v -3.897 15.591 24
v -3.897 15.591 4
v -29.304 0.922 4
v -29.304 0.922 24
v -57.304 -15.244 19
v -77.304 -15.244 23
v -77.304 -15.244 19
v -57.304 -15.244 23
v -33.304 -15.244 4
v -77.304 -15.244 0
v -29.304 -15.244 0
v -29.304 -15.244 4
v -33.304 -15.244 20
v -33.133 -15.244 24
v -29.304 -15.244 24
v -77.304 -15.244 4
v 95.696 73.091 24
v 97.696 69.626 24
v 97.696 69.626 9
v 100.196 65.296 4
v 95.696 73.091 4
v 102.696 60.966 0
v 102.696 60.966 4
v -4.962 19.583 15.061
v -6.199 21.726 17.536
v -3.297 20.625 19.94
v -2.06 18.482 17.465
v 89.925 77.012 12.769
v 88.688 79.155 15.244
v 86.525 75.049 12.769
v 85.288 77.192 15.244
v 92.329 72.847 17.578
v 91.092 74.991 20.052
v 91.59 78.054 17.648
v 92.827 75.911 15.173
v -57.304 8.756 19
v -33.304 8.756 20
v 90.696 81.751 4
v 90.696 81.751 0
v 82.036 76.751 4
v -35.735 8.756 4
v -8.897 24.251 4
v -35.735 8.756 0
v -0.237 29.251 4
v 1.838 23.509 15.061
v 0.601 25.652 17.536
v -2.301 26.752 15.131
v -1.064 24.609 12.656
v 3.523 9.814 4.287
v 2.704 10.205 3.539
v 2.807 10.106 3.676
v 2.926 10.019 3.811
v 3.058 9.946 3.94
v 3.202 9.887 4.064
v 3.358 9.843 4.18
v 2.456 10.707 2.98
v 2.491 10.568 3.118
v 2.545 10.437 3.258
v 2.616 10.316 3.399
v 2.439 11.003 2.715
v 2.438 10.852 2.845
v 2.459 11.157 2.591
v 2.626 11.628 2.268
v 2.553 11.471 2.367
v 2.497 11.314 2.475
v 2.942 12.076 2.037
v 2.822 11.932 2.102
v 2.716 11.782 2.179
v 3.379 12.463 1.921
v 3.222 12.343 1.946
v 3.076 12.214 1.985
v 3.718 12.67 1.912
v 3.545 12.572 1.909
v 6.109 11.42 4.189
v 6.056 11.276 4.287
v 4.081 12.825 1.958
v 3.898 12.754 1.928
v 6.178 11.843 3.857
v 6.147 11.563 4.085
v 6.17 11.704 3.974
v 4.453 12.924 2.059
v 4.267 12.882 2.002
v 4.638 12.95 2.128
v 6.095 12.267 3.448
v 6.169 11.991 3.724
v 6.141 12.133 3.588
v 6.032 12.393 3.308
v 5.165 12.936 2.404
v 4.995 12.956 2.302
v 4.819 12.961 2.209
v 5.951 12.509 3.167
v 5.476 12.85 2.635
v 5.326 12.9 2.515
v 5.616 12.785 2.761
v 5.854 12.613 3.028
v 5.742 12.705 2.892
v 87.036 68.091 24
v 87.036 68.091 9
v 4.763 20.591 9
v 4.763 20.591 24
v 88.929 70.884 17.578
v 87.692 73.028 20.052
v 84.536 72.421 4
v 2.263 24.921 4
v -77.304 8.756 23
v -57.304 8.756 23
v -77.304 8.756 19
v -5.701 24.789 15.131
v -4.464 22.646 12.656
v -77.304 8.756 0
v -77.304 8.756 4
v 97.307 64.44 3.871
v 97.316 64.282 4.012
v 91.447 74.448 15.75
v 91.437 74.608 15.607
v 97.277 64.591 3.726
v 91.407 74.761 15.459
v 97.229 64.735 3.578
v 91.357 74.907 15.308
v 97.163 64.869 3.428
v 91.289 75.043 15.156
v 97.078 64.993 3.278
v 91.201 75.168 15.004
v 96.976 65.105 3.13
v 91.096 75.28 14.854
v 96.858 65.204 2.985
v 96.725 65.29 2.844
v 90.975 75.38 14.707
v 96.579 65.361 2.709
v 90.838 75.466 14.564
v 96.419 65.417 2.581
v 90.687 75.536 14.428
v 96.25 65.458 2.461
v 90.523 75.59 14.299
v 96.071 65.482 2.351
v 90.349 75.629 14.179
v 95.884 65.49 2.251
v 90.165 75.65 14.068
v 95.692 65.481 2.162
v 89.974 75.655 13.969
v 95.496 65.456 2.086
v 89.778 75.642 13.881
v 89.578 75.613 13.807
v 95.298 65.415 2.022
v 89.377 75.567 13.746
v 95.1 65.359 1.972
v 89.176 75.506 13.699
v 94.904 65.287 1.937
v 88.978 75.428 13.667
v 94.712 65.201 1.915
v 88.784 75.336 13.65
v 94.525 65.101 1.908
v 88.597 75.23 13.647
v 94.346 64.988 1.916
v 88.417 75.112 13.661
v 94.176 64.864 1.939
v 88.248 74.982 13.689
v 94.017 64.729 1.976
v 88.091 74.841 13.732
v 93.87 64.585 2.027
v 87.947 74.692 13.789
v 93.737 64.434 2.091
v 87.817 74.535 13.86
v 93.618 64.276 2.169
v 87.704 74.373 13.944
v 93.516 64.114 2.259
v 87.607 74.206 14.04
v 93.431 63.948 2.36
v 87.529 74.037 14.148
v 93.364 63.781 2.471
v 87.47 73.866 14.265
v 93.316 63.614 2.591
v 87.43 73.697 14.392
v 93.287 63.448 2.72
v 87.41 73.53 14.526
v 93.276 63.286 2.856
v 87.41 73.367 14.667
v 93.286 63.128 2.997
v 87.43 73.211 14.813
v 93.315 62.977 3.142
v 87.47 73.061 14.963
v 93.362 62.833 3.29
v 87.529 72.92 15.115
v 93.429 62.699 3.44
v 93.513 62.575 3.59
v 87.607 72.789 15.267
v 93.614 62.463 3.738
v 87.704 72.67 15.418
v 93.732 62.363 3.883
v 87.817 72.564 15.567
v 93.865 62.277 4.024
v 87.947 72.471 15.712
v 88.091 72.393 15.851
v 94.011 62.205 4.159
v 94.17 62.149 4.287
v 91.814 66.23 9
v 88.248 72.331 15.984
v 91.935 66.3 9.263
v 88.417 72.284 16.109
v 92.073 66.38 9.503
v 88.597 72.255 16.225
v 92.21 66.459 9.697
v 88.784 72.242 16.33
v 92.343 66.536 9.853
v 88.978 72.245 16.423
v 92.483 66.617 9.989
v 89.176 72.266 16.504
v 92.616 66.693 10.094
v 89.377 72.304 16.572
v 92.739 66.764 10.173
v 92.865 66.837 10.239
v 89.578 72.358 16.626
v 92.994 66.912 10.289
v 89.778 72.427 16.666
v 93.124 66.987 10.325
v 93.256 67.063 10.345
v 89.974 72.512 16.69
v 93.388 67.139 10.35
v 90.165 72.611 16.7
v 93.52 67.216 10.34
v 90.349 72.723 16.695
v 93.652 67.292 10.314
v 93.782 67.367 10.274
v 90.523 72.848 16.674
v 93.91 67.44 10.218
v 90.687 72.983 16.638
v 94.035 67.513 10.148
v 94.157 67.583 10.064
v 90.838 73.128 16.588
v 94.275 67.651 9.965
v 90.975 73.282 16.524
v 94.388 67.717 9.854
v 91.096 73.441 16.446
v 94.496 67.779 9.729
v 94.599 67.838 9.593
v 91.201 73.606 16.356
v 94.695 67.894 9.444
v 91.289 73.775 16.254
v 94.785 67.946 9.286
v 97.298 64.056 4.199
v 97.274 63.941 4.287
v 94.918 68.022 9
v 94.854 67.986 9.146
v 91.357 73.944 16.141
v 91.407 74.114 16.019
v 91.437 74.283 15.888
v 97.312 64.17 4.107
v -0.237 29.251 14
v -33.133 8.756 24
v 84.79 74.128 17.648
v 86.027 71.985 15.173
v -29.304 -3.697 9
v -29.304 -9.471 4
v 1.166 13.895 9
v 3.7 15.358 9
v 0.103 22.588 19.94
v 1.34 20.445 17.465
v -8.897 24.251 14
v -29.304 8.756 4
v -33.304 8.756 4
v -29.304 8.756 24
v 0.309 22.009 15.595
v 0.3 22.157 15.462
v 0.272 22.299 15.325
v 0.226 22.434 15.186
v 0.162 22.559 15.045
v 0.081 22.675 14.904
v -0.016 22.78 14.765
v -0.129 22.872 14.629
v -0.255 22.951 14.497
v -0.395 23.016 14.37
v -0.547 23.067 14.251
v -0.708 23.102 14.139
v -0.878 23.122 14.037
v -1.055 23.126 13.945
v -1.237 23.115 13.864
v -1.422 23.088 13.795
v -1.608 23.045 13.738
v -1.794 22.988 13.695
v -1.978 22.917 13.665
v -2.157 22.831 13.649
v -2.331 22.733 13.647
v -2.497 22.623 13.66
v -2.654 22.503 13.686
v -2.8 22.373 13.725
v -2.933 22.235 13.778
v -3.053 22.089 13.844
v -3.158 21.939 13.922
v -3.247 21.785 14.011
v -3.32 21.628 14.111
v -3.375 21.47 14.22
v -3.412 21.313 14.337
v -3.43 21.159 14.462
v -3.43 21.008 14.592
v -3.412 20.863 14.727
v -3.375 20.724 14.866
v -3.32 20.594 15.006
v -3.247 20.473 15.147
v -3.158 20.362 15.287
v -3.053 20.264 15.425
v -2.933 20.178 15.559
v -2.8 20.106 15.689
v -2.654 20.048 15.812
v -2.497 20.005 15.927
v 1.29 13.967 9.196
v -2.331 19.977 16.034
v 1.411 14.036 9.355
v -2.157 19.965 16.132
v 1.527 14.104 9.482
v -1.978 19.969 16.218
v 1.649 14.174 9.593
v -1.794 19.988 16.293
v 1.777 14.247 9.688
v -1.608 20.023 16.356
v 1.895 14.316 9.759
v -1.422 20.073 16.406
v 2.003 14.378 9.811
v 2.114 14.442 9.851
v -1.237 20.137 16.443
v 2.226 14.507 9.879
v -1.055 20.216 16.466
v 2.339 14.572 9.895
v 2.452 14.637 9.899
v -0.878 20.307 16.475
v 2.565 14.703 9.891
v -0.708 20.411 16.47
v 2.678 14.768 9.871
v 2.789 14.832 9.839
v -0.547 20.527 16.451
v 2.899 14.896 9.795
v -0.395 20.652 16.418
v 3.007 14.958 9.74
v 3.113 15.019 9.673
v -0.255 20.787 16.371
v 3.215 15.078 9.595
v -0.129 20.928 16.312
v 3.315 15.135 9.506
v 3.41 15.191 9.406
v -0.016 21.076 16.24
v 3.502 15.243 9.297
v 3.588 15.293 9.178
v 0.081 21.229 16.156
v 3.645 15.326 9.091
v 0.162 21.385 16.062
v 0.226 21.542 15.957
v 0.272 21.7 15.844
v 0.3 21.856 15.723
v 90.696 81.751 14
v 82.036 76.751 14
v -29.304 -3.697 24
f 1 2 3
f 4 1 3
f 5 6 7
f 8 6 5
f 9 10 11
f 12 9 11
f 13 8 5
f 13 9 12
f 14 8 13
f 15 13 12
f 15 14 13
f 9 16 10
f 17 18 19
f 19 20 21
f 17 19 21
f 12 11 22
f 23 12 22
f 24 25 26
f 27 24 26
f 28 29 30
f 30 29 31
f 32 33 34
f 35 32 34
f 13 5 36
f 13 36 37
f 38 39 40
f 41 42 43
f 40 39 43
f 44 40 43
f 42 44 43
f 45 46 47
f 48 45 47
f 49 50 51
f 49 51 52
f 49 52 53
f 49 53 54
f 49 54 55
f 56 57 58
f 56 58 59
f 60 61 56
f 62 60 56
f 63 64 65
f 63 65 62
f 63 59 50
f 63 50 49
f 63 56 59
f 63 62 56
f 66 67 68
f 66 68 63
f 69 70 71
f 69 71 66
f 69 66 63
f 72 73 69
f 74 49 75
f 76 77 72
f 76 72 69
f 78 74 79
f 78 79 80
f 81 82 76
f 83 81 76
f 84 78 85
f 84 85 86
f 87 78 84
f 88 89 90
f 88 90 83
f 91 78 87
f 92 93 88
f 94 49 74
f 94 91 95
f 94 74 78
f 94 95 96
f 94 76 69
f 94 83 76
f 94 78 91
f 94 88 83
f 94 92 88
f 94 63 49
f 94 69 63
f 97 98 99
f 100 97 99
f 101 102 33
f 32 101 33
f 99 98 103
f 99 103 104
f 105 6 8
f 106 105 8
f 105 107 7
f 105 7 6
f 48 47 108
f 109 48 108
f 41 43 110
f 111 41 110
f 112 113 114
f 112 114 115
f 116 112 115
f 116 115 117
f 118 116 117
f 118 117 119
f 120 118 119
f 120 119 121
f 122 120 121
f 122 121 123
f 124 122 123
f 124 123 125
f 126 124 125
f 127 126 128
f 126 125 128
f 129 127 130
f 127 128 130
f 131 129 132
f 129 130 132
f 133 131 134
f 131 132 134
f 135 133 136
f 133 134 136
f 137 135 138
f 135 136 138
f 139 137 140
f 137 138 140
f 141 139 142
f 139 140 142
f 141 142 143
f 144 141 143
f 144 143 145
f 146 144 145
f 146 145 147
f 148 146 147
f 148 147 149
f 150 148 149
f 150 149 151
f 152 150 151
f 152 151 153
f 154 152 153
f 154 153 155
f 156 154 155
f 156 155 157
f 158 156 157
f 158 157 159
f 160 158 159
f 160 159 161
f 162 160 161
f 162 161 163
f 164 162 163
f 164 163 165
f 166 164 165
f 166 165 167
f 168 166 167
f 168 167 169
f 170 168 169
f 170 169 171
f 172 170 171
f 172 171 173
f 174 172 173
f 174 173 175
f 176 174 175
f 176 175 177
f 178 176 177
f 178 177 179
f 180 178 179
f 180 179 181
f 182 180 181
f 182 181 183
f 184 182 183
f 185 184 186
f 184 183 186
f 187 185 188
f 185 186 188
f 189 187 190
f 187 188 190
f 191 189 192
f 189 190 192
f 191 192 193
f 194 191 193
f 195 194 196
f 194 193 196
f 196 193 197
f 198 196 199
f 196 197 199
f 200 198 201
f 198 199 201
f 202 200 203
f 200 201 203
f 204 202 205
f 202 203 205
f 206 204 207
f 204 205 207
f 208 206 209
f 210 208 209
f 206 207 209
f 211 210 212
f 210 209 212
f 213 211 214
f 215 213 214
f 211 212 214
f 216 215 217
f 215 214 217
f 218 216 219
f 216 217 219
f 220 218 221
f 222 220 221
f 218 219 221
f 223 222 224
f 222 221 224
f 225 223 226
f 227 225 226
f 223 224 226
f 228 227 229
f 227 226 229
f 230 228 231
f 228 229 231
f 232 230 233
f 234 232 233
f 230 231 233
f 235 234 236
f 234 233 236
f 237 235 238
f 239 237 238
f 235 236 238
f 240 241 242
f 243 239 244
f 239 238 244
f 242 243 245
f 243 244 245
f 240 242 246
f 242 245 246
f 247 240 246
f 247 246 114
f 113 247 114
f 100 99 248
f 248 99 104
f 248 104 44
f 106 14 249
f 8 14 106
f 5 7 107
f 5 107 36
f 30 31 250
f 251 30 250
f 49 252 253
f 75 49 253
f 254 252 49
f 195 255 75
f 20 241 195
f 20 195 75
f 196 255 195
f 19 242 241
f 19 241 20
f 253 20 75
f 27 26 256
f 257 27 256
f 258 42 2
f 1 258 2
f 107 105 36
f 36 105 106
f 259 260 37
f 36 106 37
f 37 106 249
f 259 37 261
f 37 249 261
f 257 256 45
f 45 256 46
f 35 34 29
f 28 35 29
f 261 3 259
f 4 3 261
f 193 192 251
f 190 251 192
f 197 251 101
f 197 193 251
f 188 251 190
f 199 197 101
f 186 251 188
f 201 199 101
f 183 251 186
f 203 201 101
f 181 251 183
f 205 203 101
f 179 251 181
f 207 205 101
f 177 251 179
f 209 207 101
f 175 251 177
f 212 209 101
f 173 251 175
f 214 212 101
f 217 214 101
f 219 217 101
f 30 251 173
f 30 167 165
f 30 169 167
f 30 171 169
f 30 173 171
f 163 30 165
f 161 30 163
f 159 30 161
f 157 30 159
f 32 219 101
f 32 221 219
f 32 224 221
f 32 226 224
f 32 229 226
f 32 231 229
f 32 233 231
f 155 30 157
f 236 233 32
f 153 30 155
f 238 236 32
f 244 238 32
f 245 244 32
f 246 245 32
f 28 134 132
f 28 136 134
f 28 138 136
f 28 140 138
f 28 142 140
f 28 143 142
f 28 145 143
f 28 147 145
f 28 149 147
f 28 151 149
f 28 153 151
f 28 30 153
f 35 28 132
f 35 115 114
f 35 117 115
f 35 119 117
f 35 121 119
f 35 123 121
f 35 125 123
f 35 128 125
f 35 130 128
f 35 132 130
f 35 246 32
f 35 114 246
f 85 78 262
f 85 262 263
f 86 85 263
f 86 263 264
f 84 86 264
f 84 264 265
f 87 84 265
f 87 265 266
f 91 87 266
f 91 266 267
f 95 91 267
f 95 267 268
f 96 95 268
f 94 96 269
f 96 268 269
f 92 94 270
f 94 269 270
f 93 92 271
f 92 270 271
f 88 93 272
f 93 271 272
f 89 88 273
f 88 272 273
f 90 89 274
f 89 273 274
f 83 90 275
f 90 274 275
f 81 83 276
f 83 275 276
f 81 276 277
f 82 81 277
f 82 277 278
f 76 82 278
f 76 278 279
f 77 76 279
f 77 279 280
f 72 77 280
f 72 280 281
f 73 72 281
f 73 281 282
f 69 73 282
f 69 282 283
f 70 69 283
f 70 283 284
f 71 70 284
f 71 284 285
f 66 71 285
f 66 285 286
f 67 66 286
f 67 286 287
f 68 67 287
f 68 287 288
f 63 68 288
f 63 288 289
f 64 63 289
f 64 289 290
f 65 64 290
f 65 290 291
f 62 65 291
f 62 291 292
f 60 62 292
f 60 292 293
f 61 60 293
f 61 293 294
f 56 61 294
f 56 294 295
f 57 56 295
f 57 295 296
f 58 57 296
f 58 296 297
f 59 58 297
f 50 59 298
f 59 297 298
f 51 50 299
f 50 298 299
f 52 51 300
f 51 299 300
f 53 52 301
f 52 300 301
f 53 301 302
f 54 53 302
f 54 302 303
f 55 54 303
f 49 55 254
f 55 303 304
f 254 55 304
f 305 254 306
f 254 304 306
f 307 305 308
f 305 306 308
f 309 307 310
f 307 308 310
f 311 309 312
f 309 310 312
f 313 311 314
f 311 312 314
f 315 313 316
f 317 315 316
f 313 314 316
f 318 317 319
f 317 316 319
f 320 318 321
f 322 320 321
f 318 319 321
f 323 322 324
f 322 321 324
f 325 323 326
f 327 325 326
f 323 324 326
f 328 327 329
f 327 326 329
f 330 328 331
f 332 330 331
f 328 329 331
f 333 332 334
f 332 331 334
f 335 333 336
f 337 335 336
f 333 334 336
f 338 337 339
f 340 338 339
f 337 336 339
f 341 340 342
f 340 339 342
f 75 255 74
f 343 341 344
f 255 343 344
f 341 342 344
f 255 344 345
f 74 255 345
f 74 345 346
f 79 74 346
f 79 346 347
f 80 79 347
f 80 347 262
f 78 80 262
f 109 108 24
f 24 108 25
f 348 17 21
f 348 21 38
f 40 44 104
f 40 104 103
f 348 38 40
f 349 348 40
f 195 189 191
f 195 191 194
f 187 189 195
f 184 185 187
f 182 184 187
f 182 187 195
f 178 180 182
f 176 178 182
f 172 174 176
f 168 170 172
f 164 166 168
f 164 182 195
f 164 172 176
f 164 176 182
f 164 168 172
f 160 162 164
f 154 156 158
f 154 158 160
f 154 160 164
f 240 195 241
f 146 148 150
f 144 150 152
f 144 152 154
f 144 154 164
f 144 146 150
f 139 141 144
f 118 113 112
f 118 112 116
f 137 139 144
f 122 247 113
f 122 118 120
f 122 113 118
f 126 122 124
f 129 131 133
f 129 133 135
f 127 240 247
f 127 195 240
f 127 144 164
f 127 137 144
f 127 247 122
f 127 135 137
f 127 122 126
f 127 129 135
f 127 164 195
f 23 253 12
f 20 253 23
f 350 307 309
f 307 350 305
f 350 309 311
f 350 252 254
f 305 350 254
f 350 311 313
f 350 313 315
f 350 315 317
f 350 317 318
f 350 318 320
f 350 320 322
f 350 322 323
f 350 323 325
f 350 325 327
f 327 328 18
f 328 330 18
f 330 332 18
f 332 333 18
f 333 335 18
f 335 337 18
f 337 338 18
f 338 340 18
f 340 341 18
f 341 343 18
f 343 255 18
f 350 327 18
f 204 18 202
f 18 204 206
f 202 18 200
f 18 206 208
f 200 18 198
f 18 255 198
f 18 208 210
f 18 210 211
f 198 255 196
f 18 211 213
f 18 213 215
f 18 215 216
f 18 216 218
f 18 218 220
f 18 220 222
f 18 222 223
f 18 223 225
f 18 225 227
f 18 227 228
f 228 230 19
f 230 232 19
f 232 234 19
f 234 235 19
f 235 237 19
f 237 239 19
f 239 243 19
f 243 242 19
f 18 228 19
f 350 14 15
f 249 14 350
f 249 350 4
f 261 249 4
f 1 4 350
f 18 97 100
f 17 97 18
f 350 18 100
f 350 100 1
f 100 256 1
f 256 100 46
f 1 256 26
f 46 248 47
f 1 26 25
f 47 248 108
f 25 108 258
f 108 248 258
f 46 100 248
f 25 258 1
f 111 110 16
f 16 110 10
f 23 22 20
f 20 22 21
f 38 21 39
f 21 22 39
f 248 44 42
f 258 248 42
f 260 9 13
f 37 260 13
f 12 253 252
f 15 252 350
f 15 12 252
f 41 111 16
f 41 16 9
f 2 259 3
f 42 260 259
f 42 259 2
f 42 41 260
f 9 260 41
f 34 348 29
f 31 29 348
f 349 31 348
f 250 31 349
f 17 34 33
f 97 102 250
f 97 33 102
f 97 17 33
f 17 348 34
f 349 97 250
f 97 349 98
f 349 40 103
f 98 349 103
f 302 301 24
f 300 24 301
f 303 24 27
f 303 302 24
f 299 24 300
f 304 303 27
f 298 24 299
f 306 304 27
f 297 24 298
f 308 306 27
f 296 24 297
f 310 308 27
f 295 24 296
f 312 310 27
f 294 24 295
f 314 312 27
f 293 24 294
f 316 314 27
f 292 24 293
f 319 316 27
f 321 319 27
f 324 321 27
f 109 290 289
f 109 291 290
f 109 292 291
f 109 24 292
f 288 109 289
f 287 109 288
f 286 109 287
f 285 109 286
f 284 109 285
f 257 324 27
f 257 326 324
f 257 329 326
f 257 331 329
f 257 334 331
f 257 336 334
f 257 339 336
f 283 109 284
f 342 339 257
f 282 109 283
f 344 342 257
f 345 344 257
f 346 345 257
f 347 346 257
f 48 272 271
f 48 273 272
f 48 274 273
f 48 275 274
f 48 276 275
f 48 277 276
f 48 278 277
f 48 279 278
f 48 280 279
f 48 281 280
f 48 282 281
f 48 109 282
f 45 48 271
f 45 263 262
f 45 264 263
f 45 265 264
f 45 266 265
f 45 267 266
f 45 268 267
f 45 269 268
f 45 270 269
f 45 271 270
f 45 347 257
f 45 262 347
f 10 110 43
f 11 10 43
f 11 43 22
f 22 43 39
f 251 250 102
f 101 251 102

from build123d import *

# Parameters (mm, degrees)
F1_DEPTH  = 4
F2_W      = 4
F2_H      = 16
F2_W_2    = 20
F2_H_2    = 4
F3_DEPTH  = 24
F5_DEPTH  = 20
F7_DEPTH  = 20
F8_SIZE   = 10
F9_SIZE   = 5
F10_R     = 2
F10_R_2   = 2.1593554105
F11_DEPTH = 20.1
F13_DEPTH = 3.5
F15_DEPTH = 3.5


with BuildPart() as f1:
    # F0 (on Top) → F1 (new body)
    with BuildSketch(Plane.XY):
        Polygon((-35.7348556412, 8.7559268959), (-77.3040750229, 8.7559268959), (-77.3040750229, -15.2440731041), (-29.3040750229, -15.2440731041), (-29.3040750229, -2.3825118674), align=None)
        Polygon((90.6959249771, 81.7507721197), (-35.7348556412, 8.7559268959), (-29.3040750229, 8.7559268959), (-29.3040750229, -2.3825118674), (-23.7348556412, -12.0286827949), (102.6959249771, 60.9661624289), align=None)
        Polygon((-29.3040750229, 8.7559268959), (-35.7348556412, 8.7559268959), (-29.3040750229, -2.3825118674), align=None)
        Polygon((-23.7348556412, -12.0286827949), (-29.3040750229, -2.3825118674), (-29.3040750229, -15.2440731041), align=None)
    extrude(amount=F1_DEPTH)

    # F2 (on face) → F3 (join)
    with BuildSketch(Plane.XZ.offset(15.2440731041)):
        with Locations((-31.3040750229, 12)):
            Rectangle(F2_W, F2_H)
        Polygon((-33.3040750229, 20), (-29.3040750229, 20), (-29.3040750229, 24), (-33.1334466886, 24), (-57.3040750229, 23), (-57.3040750229, 19), align=None)
        with Locations((-67.3040750229, 21)):
            Rectangle(F2_W_2, F2_H_2)
    extrude(amount=-F3_DEPTH)

    # F4 (on face) → F5 (join)
    with BuildSketch(Plane.XY.offset(4)):
        Polygon((-29.3040750229, -3.6970677203), (97.6959249771, 69.6264164668), (95.6959249771, 73.0905180819), (-29.3040750229, 0.9217344332), align=None)
    extrude(amount=F5_DEPTH)

    # F6 (on face) → F7 (join)
    with BuildSketch(Plane.XY.offset(4)):
        Polygon((87.0356709393, 68.0905180819), (95.6959249771, 73.0905180819), (90.6959249771, 81.7507721197), (82.0356709393, 76.7507721197), align=None)
        Polygon((4.7632575798, 20.5905180819), (-0.2367424202, 29.2507721197), (-8.8969964581, 24.2507721197), (-3.8969964581, 15.5905180819), align=None)
    extrude(amount=F7_DEPTH)

    # F8
    f8_edges = [f1.edges().sort_by_distance(p)[0] for p in [
        (86.365798, 79.250772, 24),
        (-4.566869, 26.750772, 24),
    ]]
    chamfer(f8_edges, length=F8_SIZE)

    # F9
    f9_edges = [f1.edges().sort_by_distance(p)[0] for p in [
        (34.195925, 32.964674, 4),
        (45.899464, 44.340518, 4),
    ]]
    chamfer(f9_edges, length=F9_SIZE)

    # F10 (on face) → F11 (cut)
    with BuildSketch(Plane(origin=(-9.8625707365, 17.0824736089, 19.7251414731), x_dir=(0.9354143467, 0.2314550249, 0.2672612419), z_dir=(-0.3535533906, 0.6123724357, 0.7071067812))):
        with Locations((7.5511651872, 6.4274310849)):
            Circle(F10_R)
        with Locations((104.822506347, 45.9661663088)):
            Circle(F10_R_2)
    extrude(amount=-F11_DEPTH, mode=Mode.SUBTRACT)

    # F12 (on face) → F13 (cut)
    with BuildSketch(Plane(origin=(-9.8625707365, 17.0824736089, 19.7251414731), x_dir=(0.9354143467, 0.2314550249, 0.2672612419), z_dir=(-0.3535533906, 0.6123724357, 0.7071067812))):
        Polygon((101.187753457, 44.4822846552), (104.2902091103, 42.0764371428), (107.9249620003, 43.5603187964), (108.457259237, 47.4500479624), (105.3548035838, 49.8558954748), (101.7200506938, 48.3720138212), align=None)
    extrude(amount=-F13_DEPTH, mode=Mode.SUBTRACT)

    # F14 (on face) → F15 (cut)
    with BuildSketch(Plane(origin=(-9.8625707365, 17.0824736089, 19.7251414731), x_dir=(0.9354143467, 0.2314550249, 0.2672612419), z_dir=(-0.3535533906, 0.6123724357, 0.7071067812))):
        Polygon((3.9164122972, 4.9435494313), (7.0188679504, 2.5377019189), (10.6536208404, 4.0215835725), (11.1859180772, 7.9113127385), (8.0834624239, 10.3171602509), (4.4487095339, 8.8332785973), align=None)
    extrude(amount=-F15_DEPTH, mode=Mode.SUBTRACT)


solid = f1.part
